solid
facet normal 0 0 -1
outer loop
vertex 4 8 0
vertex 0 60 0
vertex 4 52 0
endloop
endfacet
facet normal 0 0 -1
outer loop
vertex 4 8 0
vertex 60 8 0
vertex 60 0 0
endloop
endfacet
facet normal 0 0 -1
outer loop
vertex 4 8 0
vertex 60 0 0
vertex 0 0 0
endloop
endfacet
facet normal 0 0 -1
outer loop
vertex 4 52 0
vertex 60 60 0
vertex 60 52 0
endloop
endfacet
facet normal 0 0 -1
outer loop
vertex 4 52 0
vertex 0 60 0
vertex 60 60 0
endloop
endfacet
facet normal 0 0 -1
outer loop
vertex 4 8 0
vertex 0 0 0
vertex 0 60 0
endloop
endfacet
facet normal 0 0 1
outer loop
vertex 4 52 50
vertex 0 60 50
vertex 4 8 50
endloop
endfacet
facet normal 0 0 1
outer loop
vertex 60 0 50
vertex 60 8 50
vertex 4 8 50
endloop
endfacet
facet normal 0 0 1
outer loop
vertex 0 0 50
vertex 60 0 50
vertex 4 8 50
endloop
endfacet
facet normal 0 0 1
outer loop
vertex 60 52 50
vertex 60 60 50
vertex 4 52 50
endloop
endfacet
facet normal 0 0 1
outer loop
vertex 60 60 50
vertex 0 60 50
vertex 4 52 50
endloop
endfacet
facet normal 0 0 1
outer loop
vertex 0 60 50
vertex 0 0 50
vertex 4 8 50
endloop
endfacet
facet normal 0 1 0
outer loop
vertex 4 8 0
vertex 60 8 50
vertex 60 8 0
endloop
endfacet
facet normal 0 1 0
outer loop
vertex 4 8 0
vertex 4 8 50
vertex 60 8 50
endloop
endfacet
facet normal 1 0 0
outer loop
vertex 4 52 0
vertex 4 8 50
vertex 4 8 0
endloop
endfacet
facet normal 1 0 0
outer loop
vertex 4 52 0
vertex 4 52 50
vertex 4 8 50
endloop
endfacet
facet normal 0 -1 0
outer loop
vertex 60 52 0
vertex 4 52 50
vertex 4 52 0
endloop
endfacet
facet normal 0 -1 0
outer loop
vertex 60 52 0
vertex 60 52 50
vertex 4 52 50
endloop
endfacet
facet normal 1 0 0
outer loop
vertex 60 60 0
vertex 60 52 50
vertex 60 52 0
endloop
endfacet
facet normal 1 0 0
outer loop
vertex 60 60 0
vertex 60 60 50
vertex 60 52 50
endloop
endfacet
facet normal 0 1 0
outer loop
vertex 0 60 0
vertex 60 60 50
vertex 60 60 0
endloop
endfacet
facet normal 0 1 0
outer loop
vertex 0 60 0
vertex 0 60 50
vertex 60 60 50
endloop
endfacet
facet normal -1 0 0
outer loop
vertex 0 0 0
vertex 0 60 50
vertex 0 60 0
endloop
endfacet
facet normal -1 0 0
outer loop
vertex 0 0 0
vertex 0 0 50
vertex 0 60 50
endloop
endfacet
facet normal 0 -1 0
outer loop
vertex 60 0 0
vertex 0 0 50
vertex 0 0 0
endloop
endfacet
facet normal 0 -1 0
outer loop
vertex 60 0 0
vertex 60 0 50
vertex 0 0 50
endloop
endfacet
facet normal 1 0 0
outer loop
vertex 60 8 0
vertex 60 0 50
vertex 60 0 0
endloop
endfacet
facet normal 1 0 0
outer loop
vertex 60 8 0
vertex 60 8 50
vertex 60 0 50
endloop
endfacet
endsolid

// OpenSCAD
$fn = 32;

// ----------------------------------------------------------------------
// Structural section: channel 60 x 60 mm
// ----------------------------------------------------------------------

// --- parameters (mm) ---
sec_w = 60;               // channel width, X
sec_h = 60;               // channel height, Y
flange_t = 8;             // flange thickness
web_t = 4;                // web thickness
plate_t = 50;             // cut length, Z (extrusion height)

profile = [[0, 0], [60, 0], [60, 8], [4, 8], [4, 52], [60, 52], [60, 60], [0, 60]];  // primary outline, 8 points, counter clockwise

// --- the one profile operation ---
linear_extrude(height = plate_t) polygon(points = profile);
